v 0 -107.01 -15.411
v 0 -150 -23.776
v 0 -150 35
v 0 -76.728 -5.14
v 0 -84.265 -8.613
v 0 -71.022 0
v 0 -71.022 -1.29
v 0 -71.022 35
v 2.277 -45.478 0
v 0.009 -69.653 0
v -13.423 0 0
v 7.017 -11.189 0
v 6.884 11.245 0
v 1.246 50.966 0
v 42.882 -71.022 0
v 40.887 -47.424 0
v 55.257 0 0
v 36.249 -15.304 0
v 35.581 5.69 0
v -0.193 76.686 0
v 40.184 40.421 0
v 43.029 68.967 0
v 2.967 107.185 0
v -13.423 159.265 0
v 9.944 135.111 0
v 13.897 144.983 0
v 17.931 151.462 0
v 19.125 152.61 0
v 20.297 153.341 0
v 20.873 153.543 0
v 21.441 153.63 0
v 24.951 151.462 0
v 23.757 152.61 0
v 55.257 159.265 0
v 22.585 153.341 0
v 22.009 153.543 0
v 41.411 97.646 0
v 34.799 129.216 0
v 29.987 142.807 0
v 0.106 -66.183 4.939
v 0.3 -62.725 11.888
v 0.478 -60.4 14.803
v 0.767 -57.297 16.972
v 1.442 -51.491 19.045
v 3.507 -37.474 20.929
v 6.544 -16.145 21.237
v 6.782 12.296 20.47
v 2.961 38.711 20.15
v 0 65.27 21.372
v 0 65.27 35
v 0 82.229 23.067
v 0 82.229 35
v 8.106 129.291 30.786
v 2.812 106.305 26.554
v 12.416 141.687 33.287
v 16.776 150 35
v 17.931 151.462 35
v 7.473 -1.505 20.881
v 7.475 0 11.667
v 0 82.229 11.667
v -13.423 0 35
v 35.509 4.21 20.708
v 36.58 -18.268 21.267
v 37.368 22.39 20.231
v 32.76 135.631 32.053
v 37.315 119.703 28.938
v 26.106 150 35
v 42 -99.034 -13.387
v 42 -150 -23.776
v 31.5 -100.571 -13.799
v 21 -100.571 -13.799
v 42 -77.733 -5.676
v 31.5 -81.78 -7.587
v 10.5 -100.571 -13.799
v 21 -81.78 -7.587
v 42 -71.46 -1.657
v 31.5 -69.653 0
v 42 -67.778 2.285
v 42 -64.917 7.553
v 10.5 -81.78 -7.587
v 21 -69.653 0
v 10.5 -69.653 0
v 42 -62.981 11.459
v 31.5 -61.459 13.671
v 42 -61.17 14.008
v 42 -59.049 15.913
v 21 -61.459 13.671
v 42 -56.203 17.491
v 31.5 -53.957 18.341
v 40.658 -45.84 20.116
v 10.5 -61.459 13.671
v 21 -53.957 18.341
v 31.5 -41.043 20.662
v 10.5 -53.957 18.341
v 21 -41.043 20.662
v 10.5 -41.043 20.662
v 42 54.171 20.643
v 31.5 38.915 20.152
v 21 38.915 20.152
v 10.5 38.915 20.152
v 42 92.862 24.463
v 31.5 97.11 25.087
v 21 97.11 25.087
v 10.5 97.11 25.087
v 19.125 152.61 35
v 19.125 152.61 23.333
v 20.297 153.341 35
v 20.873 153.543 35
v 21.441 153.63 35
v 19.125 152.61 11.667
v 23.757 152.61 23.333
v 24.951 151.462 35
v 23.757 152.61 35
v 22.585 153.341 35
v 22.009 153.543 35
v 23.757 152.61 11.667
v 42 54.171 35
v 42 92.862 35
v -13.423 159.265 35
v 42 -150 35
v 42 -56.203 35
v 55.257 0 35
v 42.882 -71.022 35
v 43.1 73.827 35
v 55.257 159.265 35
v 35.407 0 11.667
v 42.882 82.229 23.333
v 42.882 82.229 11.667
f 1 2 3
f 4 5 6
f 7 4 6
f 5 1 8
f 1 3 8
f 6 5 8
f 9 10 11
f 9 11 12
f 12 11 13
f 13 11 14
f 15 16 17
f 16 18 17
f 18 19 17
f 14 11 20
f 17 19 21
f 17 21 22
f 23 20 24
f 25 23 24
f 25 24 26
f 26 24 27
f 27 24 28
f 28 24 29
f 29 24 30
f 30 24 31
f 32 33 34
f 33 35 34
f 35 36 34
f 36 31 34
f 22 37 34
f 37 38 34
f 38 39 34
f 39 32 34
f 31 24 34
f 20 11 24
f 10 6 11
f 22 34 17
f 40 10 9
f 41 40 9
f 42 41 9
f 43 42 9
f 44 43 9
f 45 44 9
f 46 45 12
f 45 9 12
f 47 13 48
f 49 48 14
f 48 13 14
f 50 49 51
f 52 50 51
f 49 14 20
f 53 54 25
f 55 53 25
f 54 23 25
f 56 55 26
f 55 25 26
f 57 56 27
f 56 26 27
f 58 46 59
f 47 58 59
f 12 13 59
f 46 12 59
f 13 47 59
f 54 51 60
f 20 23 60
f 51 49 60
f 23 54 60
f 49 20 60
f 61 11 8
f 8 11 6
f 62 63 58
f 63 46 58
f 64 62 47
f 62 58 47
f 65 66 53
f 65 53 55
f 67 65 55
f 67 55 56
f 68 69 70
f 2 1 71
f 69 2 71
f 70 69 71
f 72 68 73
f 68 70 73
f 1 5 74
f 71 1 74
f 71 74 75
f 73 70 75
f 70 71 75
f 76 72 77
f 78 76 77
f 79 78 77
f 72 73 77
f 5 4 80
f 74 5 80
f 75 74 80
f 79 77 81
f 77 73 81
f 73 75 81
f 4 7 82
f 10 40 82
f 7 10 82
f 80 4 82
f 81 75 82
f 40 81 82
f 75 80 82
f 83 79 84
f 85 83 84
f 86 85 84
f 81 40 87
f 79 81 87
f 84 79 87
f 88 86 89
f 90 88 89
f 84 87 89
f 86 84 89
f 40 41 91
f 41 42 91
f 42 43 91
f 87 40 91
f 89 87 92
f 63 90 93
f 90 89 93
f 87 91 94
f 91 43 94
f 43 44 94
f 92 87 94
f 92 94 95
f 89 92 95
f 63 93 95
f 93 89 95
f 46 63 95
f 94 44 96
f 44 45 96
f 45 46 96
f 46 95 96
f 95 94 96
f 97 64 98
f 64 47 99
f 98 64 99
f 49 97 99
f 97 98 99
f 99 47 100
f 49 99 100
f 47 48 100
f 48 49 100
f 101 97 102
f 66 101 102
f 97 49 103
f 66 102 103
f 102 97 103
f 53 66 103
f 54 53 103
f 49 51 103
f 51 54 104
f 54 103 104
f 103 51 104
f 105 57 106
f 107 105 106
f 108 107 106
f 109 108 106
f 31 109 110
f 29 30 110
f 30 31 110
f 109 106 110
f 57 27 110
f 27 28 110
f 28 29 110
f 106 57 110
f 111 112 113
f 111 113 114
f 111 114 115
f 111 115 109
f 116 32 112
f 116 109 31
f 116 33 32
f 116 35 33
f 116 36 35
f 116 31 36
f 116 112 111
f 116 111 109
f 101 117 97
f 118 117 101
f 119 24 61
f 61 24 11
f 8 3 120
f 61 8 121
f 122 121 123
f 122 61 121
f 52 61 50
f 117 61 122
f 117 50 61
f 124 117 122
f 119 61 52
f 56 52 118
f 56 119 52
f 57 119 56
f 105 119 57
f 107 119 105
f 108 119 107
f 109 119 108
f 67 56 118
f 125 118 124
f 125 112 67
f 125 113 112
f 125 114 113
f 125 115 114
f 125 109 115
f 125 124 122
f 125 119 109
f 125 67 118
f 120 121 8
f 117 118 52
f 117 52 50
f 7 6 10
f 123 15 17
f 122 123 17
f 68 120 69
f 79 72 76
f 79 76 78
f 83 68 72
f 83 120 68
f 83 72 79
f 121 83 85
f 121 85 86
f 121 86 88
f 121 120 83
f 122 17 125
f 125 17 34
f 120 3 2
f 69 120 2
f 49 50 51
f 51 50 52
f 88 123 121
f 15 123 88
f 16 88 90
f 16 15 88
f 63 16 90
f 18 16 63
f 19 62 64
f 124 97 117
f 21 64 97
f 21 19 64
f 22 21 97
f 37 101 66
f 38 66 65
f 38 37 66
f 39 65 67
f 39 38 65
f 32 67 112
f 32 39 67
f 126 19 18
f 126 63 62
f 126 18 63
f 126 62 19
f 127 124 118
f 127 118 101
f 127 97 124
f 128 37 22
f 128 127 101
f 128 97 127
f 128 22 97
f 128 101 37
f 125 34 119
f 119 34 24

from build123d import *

# Parameters (mm, degrees)
F2_DEPTH = 42
F3_DEPTH = 50
F4_DEPTH = 35


with BuildPart() as f2:
    # F1 (on Right) → F2 (new body)
    with BuildSketch(Plane.YZ):
        with BuildLine():
            Line((150, 35), (-150, 35))
            Line((-150, 35), (-150, -23.7761443613))
            add(Edge.make_bspline(
                [(-150, -23.7761443613), (-114.4989336933, -17.6506601351), (-63.6066313007, -8.0329394516), (-65.3826376361, 27.3288233891), (48.3048096846, 13.9929555256), (115.32909223, 27.83807524), (150, 35)],
                knots=[0.0176256107, 0.0176256107, 0.0176256107, 0.0176256107, 0.2771319135, 0.4057749729, 0.6926140747, 1, 1, 1, 1], degree=3))
        make_face()
    extrude(amount=F2_DEPTH)

    # F0 (on Top) → F3 (cut)
    with BuildSketch(Plane.XY):
        with BuildLine():
            Line((-13.4228849784, 0), (0, -71.0220535528))
            add(Edge.make_bspline(
                [(0, -71.0220535528), (0, -48.0822075317), (15.7714172383, 2.9708873893), (-9.184915464, 68.9182100809), (10.146482255, 142.7383784786), (17.930894995, 151.4622155134)],
                knots=[0, 0, 0, 0, 0.2430856885, 0.5044652694, 0.7195950008, 0.7195950008, 0.7195950008, 0.7195950008], degree=3))
            add(Edge.make_bspline(
                [(21.4410424232, 153.6304205656), (20.2112647145, 153.6956795849), (19.0445034859, 152.9269522058), (17.930894995, 151.4622155134)],
                knots=[0.752832966, 0.752832966, 0.752832966, 0.752832966, 0.7890941529, 0.7890941529, 0.7890941529, 0.7890941529], degree=3))
            add(Edge.make_bspline(
                [(21.4410424232, 153.6304205656), (22.670820132, 153.6956795849), (23.8375813606, 152.9269522058), (24.9511898515, 151.4622155134)],
                knots=[0.752832966, 0.752832966, 0.752832966, 0.752832966, 0.7890941529, 0.7890941529, 0.7890941529, 0.7890941529], degree=3))
            add(Edge.make_bspline(
                [(42.8820848465, -71.0220535528), (42.8820848465, -48.0822075317), (27.1106676082, 2.9708873893), (52.0670003105, 68.9182100809), (32.7356025915, 142.7383784786), (24.9511898515, 151.4622155134)],
                knots=[0, 0, 0, 0, 0.2430856885, 0.5044652694, 0.7195950008, 0.7195950008, 0.7195950008, 0.7195950008], degree=3))
            Line((42.8820848465, -71.0220535528), (55.256780237, 0))
            Line((55.256780237, 0), (55.256780237, 159.2645645142))
            Line((55.256780237, 159.2645645142), (-13.4228849784, 159.2645645142))
            Line((-13.4228849784, 159.2645645142), (-13.4228849784, 0))
        make_face()
        with BuildLine():
            add(Edge.make_bspline(
                [(21.4410424232, 153.6304205656), (20.2112647145, 153.6956795849), (19.0445034859, 152.9269522058), (17.930894995, 151.4622155134)],
                knots=[0.752832966, 0.752832966, 0.752832966, 0.752832966, 0.7890941529, 0.7890941529, 0.7890941529, 0.7890941529], degree=3))
            add(Edge.make_bspline(
                [(17.930894995, 151.4622155134), (19.1336020212, 152.8100654344), (20.3137955765, 153.5706024186), (21.4410424232, 153.6304205656)],
                knots=[0.7195950008, 0.7195950008, 0.7195950008, 0.7195950008, 0.752832966, 0.752832966, 0.752832966, 0.752832966], degree=3))
        make_face()
        with BuildLine():
            add(Edge.make_bspline(
                [(21.4410424232, 153.6304205656), (22.670820132, 153.6956795849), (23.8375813606, 152.9269522058), (24.9511898515, 151.4622155134)],
                knots=[0.752832966, 0.752832966, 0.752832966, 0.752832966, 0.7890941529, 0.7890941529, 0.7890941529, 0.7890941529], degree=3))
            add(Edge.make_bspline(
                [(24.9511898515, 151.4622155134), (23.7484828253, 152.8100654344), (22.56828927, 153.5706024186), (21.4410424232, 153.6304205656)],
                knots=[0.7195950008, 0.7195950008, 0.7195950008, 0.7195950008, 0.752832966, 0.752832966, 0.752832966, 0.752832966], degree=3))
        make_face()
    extrude(amount=-F3_DEPTH, mode=Mode.SUBTRACT)

    # F0 (on Top) → F4 (join)
    with BuildSketch(Plane.XY):
        with BuildLine():
            Line((-13.4228849784, 0), (0, -71.0220535528))
            add(Edge.make_bspline(
                [(0, -71.0220535528), (0, -48.0822075317), (15.7714172383, 2.9708873893), (-9.184915464, 68.9182100809), (10.146482255, 142.7383784786), (17.930894995, 151.4622155134)],
                knots=[0, 0, 0, 0, 0.2430856885, 0.5044652694, 0.7195950008, 0.7195950008, 0.7195950008, 0.7195950008], degree=3))
            add(Edge.make_bspline(
                [(21.4410424232, 153.6304205656), (20.2112647145, 153.6956795849), (19.0445034859, 152.9269522058), (17.930894995, 151.4622155134)],
                knots=[0.752832966, 0.752832966, 0.752832966, 0.752832966, 0.7890941529, 0.7890941529, 0.7890941529, 0.7890941529], degree=3))
            add(Edge.make_bspline(
                [(21.4410424232, 153.6304205656), (22.670820132, 153.6956795849), (23.8375813606, 152.9269522058), (24.9511898515, 151.4622155134)],
                knots=[0.752832966, 0.752832966, 0.752832966, 0.752832966, 0.7890941529, 0.7890941529, 0.7890941529, 0.7890941529], degree=3))
            add(Edge.make_bspline(
                [(42.8820848465, -71.0220535528), (42.8820848465, -48.0822075317), (27.1106676082, 2.9708873893), (52.0670003105, 68.9182100809), (32.7356025915, 142.7383784786), (24.9511898515, 151.4622155134)],
                knots=[0, 0, 0, 0, 0.2430856885, 0.5044652694, 0.7195950008, 0.7195950008, 0.7195950008, 0.7195950008], degree=3))
            Line((42.8820848465, -71.0220535528), (55.256780237, 0))
            Line((55.256780237, 0), (55.256780237, 159.2645645142))
            Line((55.256780237, 159.2645645142), (-13.4228849784, 159.2645645142))
            Line((-13.4228849784, 159.2645645142), (-13.4228849784, 0))
        make_face()
        with BuildLine():
            add(Edge.make_bspline(
                [(21.4410424232, 153.6304205656), (20.2112647145, 153.6956795849), (19.0445034859, 152.9269522058), (17.930894995, 151.4622155134)],
                knots=[0.752832966, 0.752832966, 0.752832966, 0.752832966, 0.7890941529, 0.7890941529, 0.7890941529, 0.7890941529], degree=3))
            add(Edge.make_bspline(
                [(17.930894995, 151.4622155134), (19.1336020212, 152.8100654344), (20.3137955765, 153.5706024186), (21.4410424232, 153.6304205656)],
                knots=[0.7195950008, 0.7195950008, 0.7195950008, 0.7195950008, 0.752832966, 0.752832966, 0.752832966, 0.752832966], degree=3))
        make_face()
        with BuildLine():
            add(Edge.make_bspline(
                [(21.4410424232, 153.6304205656), (22.670820132, 153.6956795849), (23.8375813606, 152.9269522058), (24.9511898515, 151.4622155134)],
                knots=[0.752832966, 0.752832966, 0.752832966, 0.752832966, 0.7890941529, 0.7890941529, 0.7890941529, 0.7890941529], degree=3))
            add(Edge.make_bspline(
                [(24.9511898515, 151.4622155134), (23.7484828253, 152.8100654344), (22.56828927, 153.5706024186), (21.4410424232, 153.6304205656)],
                knots=[0.7195950008, 0.7195950008, 0.7195950008, 0.7195950008, 0.752832966, 0.752832966, 0.752832966, 0.752832966], degree=3))
        make_face()
    extrude(amount=F4_DEPTH)


solid = f2.part
